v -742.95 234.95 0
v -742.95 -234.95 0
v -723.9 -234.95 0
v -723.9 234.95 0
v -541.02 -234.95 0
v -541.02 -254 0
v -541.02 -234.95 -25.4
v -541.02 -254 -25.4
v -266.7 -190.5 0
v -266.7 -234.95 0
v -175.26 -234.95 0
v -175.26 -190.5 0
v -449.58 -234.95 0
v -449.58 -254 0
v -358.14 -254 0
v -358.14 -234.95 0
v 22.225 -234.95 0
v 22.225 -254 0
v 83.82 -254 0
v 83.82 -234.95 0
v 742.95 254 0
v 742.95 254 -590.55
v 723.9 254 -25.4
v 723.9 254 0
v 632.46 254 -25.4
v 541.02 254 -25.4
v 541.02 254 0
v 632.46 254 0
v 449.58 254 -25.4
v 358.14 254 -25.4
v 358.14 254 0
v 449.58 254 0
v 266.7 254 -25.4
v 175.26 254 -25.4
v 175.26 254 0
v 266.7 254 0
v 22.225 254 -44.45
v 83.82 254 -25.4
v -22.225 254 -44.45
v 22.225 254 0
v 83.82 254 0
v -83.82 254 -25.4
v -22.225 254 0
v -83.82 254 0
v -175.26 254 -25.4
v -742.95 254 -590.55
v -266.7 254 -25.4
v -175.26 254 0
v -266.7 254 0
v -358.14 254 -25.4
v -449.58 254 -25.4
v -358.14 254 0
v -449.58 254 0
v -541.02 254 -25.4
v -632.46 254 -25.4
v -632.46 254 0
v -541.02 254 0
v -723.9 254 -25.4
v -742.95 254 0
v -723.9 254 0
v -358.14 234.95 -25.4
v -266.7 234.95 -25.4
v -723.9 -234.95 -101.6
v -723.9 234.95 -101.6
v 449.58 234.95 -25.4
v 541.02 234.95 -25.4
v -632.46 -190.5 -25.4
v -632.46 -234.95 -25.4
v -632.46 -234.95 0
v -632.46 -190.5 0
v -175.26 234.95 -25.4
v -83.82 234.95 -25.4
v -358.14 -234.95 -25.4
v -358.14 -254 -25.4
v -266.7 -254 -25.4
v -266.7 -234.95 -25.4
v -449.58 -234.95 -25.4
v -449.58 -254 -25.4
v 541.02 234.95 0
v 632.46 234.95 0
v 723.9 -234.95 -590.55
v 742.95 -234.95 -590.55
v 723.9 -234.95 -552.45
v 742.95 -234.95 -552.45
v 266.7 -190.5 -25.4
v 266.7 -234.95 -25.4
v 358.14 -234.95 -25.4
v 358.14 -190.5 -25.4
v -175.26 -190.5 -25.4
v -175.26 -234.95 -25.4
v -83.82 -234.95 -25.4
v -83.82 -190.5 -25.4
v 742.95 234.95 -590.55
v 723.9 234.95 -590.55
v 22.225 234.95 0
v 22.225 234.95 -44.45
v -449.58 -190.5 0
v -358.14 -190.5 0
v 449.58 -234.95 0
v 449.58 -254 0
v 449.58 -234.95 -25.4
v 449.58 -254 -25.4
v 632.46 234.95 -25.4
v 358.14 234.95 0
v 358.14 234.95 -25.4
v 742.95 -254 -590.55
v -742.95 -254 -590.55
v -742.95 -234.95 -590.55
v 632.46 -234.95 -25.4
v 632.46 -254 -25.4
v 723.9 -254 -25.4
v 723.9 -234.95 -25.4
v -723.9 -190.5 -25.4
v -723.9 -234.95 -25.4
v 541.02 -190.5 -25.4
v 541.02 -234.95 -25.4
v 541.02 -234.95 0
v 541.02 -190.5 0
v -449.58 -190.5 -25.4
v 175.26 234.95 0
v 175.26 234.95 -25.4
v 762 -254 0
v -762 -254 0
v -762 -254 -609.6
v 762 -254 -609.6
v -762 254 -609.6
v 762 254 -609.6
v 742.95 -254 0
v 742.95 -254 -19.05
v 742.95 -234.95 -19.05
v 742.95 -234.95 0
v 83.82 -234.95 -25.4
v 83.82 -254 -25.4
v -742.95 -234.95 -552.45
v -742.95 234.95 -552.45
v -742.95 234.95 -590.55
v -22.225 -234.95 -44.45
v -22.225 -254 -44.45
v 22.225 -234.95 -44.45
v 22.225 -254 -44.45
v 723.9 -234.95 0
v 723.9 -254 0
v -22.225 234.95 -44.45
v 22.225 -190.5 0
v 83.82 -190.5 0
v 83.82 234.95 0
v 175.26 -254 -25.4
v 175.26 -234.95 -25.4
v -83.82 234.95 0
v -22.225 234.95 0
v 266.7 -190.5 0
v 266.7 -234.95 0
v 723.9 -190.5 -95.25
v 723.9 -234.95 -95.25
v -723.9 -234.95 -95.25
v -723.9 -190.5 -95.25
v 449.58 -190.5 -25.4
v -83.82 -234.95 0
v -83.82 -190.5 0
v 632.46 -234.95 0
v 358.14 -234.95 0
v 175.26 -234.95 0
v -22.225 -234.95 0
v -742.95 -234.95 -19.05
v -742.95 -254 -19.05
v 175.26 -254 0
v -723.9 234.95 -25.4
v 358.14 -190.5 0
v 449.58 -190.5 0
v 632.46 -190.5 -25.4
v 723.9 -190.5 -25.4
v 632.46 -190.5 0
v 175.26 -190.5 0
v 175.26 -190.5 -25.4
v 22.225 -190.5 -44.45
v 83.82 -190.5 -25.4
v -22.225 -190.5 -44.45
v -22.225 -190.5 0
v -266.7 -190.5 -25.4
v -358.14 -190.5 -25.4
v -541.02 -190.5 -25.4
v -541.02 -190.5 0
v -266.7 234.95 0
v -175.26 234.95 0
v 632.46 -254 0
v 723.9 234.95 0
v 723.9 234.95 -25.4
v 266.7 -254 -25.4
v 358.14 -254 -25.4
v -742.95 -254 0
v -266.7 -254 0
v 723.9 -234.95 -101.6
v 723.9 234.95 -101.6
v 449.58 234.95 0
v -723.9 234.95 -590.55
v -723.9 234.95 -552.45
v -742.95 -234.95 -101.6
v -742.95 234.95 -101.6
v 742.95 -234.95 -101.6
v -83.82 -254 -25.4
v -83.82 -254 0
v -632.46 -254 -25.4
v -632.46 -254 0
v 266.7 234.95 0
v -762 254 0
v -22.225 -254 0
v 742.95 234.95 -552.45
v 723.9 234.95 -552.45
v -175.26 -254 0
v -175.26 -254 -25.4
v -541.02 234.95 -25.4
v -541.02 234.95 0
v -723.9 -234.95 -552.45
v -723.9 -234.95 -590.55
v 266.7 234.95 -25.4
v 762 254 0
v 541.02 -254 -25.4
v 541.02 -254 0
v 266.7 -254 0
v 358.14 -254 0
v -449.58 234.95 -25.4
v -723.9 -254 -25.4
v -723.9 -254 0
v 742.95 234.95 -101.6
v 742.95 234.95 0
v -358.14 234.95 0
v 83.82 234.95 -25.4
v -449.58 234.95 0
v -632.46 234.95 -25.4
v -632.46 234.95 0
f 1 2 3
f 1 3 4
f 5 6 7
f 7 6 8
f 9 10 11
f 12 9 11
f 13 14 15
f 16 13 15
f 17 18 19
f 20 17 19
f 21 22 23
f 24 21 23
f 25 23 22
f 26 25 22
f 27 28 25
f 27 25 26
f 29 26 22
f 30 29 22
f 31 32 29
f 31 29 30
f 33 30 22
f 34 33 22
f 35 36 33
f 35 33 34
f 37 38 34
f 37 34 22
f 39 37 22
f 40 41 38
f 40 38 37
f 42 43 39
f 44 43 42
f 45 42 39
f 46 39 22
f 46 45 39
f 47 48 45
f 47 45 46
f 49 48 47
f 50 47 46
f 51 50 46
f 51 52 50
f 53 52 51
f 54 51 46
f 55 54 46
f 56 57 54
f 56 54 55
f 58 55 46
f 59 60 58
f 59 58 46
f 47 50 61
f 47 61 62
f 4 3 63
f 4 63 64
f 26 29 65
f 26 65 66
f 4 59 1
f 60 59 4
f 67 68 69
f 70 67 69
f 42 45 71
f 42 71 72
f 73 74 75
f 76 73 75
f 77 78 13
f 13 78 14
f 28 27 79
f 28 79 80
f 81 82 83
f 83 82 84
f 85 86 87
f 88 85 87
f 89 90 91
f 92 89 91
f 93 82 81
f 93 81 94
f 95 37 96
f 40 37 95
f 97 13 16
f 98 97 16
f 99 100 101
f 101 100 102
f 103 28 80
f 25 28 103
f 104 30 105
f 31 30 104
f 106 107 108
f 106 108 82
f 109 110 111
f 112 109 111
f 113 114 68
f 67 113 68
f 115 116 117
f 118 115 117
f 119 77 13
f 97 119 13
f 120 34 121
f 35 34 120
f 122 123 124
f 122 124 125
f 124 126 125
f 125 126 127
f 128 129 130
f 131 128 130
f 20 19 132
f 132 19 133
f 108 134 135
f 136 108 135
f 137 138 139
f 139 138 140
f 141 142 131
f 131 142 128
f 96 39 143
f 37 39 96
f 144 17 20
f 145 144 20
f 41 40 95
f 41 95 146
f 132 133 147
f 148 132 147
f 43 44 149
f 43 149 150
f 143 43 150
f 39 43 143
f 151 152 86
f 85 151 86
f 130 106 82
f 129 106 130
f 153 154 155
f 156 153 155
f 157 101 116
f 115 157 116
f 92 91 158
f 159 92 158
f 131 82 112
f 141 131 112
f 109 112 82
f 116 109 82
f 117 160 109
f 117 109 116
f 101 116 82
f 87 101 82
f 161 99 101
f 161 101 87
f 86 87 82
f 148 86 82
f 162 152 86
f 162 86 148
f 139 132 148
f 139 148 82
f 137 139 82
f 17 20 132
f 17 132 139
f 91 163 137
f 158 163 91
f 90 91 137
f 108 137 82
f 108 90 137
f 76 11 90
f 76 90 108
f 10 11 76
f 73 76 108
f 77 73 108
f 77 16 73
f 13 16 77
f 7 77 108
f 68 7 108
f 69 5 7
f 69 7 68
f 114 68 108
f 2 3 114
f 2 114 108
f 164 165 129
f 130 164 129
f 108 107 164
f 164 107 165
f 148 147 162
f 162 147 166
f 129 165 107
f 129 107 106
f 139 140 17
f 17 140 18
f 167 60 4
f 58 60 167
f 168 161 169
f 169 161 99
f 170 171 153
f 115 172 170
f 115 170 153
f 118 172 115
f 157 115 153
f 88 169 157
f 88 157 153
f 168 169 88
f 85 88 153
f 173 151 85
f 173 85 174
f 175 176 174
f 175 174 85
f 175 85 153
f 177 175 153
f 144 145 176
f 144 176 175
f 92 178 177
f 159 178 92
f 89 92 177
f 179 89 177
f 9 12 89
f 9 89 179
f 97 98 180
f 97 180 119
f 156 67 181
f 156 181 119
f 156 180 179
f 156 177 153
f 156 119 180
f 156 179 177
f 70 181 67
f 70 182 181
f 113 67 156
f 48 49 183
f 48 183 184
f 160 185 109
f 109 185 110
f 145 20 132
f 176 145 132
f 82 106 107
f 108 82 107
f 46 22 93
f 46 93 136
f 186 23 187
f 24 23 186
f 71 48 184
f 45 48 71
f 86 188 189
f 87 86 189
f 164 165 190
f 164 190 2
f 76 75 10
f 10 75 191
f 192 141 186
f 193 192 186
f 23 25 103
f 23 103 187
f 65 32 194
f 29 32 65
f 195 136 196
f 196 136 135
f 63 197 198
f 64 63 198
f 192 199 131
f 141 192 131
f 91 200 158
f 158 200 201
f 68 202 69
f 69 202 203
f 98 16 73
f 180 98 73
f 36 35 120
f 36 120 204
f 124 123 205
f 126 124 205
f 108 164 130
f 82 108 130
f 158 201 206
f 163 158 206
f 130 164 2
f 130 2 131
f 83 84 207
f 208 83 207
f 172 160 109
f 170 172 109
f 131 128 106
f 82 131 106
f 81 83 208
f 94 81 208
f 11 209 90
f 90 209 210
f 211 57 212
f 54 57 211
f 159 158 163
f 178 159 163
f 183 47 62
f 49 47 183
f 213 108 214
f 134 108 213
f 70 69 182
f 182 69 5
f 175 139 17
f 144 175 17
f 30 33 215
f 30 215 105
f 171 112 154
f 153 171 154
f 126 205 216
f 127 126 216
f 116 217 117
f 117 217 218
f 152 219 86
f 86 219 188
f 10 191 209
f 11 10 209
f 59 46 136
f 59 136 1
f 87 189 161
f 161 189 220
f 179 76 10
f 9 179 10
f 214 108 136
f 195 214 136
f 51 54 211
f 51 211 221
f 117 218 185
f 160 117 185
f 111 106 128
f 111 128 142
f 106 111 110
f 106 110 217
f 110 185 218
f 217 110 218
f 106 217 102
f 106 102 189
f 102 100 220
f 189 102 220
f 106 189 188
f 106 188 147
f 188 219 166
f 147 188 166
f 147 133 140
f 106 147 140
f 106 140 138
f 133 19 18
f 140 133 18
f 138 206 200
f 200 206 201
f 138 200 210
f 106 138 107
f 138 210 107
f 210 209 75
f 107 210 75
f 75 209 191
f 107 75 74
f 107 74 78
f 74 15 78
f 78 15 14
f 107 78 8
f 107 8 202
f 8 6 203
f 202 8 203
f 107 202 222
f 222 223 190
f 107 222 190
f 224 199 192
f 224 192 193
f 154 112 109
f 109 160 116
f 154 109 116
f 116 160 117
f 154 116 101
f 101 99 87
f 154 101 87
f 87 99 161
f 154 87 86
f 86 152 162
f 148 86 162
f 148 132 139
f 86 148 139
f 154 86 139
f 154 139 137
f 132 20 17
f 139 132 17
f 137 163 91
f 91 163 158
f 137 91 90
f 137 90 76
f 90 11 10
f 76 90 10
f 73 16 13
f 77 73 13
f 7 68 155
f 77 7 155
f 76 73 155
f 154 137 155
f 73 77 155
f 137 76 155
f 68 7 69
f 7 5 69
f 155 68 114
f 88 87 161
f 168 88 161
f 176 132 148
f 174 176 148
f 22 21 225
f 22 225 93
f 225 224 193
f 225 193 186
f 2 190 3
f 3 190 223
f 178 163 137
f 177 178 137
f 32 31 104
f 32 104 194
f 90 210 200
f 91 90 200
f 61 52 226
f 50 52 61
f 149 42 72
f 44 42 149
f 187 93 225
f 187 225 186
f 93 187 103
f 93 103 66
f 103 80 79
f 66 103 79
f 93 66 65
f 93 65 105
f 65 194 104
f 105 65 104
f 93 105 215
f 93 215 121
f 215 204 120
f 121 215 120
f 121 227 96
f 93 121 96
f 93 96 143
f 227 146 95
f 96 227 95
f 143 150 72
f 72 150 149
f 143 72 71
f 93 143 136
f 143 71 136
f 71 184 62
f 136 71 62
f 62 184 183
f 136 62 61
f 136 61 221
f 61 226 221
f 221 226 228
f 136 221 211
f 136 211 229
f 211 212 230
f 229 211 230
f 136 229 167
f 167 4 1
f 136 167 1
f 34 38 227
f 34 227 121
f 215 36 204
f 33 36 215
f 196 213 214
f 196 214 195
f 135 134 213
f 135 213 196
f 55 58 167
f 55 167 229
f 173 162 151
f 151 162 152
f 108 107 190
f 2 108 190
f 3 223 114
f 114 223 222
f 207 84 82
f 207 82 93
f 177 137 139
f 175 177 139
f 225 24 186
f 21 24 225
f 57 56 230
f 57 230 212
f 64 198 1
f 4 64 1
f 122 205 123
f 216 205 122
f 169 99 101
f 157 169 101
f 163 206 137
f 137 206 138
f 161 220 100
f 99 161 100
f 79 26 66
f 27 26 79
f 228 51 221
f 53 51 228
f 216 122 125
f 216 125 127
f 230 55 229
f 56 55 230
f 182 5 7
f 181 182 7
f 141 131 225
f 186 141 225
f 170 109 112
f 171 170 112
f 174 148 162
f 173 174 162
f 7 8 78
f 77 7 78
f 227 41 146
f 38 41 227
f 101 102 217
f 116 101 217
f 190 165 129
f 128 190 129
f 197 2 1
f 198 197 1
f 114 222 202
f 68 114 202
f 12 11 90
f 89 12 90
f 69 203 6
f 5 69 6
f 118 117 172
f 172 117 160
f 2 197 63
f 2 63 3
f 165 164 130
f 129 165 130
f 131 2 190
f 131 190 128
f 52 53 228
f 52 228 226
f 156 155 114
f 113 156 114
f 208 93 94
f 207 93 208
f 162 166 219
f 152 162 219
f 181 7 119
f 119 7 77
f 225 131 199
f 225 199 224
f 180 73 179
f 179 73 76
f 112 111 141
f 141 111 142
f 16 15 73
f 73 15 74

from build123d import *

# Parameters (mm, degrees)
F0_W      = 1524
F0_H      = 508
F1_DEPTH  = 609.6
F2_W      = 1485.9
F2_H      = 571.5
F3_DEPTH  = 19.05
F5_DEPTH  = 44.45
F7_DEPTH  = 19.05
F8_W      = 469.9
F8_H      = 101.6
F8_H_2    = 38.1
F9_DEPTH  = 19.05
F11_W     = 1485.9
F11_H     = 19.05
F12_DEPTH = 19.05


with BuildPart() as f1:
    # F0 (on Top) → F1 (new body)
    with BuildSketch(Plane.XY):
        Rectangle(F0_W, F0_H)
    extrude(amount=-F1_DEPTH)


with BuildPart() as f3:
    # F2 (on face) → F3 (new body)
    with BuildSketch(Plane.XZ.offset(254)):
        with Locations((0, -304.8)):
            Rectangle(F2_W, F2_H)
    extrude(amount=-F3_DEPTH)


with BuildPart() as f5:
    # F4 (on face) → F5 (new body)
    with BuildSketch(Plane(origin=(0, -234.95, 0), x_dir=(-1, 0, 0), z_dir=(0, 1, 0))):
        Polygon((-723.9, -25.4), (-723.9, -95.25), (723.9, -95.25), (723.9, -25.4), (632.46, -25.4), (632.46, 0), (541.02, 0), (541.02, -25.4), (449.58, -25.4), (449.58, 0), (358.14, 0), (358.14, -25.4), (266.7, -25.4), (266.7, 0), (175.26, 0), (175.26, -25.4), (83.82, -25.4), (83.82, 0), (22.225, 0), (22.225, -44.45), (-22.225, -44.45), (-22.225, 0), (-83.82, 0), (-83.82, -25.4), (-175.26, -25.4), (-175.26, 0), (-266.7, 0), (-266.7, -25.4), (-358.14, -25.4), (-358.14, 0), (-449.58, 0), (-449.58, -25.4), (-541.02, -25.4), (-541.02, 0), (-632.46, 0), (-632.46, -25.4), align=None)
    extrude(amount=F5_DEPTH)


with BuildPart() as f7:
    # F6 (on face) → F7 (new body)
    with BuildSketch(Plane(origin=(0, 254, 0), x_dir=(-1, 0, 0), z_dir=(0, 1, 0))):
        Polygon((-742.95, 0), (-742.95, -590.55), (742.95, -590.55), (742.95, 0), (723.9, 0), (723.9, -25.4), (632.46, -25.4), (632.46, 0), (541.02, 0), (541.02, -25.4), (449.58, -25.4), (449.58, 0), (358.14, 0), (358.14, -25.4), (266.7, -25.4), (266.7, 0), (175.26, 0), (175.26, -25.4), (83.82, -25.4), (83.82, 0), (22.225, 0), (22.225, -44.45), (-22.225, -44.45), (-22.225, 0), (-83.82, 0), (-83.82, -25.4), (-175.26, -25.4), (-175.26, 0), (-266.7, 0), (-266.7, -25.4), (-358.14, -25.4), (-358.14, 0), (-449.58, 0), (-449.58, -25.4), (-541.02, -25.4), (-541.02, 0), (-632.46, 0), (-632.46, -25.4), (-723.9, -25.4), (-723.9, 0), align=None)
    extrude(amount=-F7_DEPTH)


with BuildPart() as f9:
    # F8 (on face) → F9 (new body)
    with BuildSketch(Plane.YZ.offset(742.95)):
        with Locations((0, -50.8)):
            Rectangle(F8_W, F8_H)
        with Locations((0, -571.5)):
            Rectangle(F8_W, F8_H_2)
    extrude(amount=-F9_DEPTH)


with BuildPart() as f10_1:
    # F10: instance of F9
    add(f9.part.mirror(Plane.YZ))


with BuildPart() as f12:
    # F11 (on face) → F12 (new body)
    with BuildSketch(Plane.XY.offset(-19.05)):
        with Locations((0, -244.475)):
            Rectangle(F11_W, F11_H)
    extrude(amount=F12_DEPTH)


with BuildPart() as f13_1:
    # F13: instance of F7
    add(f7.part.mirror(Plane.XZ))


solid = Compound([f1.part, f3.part, f5.part, f7.part, f9.part, f10_1.part, f12.part, f13_1.part])
